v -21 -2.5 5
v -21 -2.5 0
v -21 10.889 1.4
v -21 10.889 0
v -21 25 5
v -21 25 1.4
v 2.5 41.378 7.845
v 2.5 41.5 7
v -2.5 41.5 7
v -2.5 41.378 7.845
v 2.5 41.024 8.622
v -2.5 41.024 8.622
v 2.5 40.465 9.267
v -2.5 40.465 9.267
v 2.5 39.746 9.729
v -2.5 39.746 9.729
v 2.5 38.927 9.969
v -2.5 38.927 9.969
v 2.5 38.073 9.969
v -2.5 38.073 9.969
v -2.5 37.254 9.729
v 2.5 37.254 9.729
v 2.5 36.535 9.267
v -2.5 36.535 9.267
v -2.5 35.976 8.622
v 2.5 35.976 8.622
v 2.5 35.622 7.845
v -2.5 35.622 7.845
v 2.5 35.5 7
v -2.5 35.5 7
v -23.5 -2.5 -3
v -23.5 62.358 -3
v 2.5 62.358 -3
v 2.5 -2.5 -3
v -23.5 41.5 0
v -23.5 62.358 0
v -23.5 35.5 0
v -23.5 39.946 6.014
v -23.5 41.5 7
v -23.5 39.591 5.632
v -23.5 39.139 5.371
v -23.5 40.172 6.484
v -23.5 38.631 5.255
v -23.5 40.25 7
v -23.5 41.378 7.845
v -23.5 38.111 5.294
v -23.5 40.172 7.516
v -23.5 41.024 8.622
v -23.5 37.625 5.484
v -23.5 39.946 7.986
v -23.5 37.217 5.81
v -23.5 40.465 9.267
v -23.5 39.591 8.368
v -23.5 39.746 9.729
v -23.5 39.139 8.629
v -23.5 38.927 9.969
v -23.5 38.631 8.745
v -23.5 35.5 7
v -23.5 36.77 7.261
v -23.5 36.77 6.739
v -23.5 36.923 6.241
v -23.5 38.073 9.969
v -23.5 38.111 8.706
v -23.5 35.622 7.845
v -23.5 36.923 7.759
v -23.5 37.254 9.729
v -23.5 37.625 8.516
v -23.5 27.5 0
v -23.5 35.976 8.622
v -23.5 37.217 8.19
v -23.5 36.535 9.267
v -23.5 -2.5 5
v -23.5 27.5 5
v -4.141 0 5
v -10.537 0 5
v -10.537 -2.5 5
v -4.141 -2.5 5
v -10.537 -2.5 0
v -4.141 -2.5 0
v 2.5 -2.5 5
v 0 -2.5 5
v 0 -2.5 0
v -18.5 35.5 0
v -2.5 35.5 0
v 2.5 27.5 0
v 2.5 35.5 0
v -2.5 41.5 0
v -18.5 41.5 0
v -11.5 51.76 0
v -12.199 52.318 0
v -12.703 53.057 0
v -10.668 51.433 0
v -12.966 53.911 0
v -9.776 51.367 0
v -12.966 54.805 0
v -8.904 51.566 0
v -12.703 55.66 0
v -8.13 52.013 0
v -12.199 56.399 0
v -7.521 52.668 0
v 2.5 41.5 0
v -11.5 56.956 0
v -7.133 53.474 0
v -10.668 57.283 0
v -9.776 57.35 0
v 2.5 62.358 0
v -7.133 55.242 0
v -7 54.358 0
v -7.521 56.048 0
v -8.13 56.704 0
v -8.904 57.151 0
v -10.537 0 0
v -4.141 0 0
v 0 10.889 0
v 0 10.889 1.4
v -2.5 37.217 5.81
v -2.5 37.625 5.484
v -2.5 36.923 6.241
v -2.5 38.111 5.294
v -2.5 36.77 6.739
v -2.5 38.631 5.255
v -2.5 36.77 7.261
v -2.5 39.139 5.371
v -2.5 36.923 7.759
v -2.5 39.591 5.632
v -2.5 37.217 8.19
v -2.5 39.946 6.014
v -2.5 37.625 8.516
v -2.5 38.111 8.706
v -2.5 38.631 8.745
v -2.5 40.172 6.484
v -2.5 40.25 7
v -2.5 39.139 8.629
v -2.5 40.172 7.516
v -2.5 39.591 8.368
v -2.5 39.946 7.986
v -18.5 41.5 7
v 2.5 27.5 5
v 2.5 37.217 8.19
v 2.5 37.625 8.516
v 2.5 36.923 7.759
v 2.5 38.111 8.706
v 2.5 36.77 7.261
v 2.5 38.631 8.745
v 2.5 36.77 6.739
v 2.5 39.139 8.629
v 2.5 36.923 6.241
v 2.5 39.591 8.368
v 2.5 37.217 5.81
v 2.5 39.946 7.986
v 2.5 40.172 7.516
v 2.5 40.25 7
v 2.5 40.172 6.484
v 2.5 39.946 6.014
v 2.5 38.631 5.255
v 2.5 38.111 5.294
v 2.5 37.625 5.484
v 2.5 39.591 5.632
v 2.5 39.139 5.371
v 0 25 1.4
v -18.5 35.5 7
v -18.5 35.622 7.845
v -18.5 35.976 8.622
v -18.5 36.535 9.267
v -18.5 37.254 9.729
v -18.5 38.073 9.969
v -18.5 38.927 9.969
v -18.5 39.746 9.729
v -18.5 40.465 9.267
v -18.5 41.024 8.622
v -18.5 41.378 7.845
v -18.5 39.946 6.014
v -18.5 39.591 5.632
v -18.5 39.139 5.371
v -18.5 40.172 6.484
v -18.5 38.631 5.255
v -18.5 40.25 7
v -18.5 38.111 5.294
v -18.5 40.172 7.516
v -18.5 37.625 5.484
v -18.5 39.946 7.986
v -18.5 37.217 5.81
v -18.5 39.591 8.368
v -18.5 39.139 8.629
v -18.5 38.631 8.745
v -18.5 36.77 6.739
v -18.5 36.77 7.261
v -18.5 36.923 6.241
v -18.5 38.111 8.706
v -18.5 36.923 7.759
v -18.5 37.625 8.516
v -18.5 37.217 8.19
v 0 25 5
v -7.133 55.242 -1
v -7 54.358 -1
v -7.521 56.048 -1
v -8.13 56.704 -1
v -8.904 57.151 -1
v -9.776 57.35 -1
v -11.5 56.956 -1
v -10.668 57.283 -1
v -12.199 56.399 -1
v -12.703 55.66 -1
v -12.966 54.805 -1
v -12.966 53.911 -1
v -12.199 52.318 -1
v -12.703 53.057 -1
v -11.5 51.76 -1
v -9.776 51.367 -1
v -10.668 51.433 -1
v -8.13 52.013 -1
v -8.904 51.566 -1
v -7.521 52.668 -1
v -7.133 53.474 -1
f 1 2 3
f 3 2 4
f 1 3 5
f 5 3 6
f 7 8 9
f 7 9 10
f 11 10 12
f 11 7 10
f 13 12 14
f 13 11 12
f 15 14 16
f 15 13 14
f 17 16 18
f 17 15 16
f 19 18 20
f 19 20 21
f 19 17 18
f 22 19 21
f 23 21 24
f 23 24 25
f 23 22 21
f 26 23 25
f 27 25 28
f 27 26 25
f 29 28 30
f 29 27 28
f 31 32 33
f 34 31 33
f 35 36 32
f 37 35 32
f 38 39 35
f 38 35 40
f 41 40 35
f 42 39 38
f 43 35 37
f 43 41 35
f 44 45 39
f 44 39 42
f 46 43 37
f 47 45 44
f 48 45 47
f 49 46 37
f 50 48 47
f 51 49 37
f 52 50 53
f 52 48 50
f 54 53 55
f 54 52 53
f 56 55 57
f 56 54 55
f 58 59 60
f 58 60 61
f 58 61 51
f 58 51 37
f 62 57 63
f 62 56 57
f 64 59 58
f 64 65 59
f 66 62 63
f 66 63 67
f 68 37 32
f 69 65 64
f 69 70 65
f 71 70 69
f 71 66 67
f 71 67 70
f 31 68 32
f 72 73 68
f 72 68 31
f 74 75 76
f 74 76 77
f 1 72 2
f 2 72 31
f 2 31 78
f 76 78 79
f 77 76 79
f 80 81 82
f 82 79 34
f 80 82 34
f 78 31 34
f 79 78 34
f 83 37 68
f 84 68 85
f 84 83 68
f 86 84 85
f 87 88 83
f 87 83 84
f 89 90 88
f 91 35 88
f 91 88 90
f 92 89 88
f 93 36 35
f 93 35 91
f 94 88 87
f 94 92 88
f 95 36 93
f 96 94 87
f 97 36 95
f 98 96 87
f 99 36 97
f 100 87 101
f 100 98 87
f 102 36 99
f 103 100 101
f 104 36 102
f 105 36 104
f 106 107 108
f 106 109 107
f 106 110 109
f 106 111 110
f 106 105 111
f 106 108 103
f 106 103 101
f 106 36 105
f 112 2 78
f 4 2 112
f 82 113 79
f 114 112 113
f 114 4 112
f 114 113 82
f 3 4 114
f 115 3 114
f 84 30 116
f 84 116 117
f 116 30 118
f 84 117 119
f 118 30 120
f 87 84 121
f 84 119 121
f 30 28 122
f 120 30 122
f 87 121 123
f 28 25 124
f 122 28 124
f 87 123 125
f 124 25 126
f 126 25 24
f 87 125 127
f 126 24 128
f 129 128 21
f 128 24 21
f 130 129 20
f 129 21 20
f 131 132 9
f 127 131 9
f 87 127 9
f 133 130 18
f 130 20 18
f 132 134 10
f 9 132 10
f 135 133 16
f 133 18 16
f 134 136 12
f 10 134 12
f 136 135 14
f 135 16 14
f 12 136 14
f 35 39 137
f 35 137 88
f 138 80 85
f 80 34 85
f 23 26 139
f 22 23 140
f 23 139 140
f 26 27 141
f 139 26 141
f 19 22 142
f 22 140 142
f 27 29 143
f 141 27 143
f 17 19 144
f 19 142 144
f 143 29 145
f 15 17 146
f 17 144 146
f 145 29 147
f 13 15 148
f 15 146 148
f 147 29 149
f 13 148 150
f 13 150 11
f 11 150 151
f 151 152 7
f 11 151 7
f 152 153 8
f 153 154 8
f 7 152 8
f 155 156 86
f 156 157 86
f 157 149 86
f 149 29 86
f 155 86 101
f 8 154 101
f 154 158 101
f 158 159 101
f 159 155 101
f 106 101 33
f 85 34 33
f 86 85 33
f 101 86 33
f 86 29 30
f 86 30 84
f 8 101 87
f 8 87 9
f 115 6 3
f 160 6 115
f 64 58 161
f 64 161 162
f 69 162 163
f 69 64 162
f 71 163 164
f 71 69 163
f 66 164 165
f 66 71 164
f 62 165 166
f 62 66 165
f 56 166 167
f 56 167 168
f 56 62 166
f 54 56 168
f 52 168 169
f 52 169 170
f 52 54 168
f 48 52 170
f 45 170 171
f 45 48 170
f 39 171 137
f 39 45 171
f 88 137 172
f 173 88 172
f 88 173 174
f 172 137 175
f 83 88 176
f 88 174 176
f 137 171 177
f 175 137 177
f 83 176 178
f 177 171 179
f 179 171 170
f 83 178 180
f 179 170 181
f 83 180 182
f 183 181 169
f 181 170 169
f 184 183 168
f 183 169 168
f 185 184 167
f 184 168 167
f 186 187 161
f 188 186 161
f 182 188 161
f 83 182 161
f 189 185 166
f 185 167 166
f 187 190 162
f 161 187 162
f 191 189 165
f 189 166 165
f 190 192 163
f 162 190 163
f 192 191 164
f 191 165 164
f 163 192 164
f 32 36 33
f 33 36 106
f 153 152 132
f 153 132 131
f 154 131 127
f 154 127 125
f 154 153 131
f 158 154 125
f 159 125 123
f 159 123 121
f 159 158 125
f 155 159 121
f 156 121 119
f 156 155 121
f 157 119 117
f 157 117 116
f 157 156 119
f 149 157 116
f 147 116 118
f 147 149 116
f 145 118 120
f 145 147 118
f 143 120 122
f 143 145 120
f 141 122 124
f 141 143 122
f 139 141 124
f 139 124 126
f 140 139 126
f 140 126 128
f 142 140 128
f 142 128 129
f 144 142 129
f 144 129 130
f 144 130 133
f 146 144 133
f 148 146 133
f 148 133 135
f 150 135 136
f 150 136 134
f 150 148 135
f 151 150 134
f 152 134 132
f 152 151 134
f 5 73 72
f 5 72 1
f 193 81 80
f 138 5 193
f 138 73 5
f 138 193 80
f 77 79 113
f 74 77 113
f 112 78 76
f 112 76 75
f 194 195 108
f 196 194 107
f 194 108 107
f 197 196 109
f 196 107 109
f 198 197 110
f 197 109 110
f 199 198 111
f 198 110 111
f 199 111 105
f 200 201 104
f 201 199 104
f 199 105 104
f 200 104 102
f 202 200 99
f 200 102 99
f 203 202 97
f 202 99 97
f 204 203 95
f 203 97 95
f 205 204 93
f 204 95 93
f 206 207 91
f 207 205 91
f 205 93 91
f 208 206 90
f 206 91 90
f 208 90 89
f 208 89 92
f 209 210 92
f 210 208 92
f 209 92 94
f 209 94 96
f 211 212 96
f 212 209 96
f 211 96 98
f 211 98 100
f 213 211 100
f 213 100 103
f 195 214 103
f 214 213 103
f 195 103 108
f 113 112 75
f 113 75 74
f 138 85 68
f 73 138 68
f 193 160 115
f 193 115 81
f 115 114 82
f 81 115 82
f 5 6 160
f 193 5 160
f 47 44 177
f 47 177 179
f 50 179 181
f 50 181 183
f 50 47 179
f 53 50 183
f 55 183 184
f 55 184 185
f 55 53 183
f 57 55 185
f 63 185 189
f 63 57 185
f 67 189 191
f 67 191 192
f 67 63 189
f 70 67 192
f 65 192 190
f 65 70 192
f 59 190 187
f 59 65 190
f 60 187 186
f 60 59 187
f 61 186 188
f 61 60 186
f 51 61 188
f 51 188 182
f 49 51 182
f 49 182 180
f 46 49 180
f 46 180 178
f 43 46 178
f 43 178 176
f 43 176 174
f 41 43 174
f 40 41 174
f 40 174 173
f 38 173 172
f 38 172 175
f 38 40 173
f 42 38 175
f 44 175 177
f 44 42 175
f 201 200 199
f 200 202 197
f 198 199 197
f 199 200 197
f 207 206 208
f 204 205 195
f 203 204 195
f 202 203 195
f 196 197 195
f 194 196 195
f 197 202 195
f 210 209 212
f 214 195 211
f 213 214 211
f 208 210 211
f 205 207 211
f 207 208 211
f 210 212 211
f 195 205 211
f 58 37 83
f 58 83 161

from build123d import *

# Parameters (mm, degrees)
F0_W     = 6.3956826925
F0_H     = 2.5
F0_W_2   = 4.1414871812
F0_W_3   = 5.4119601846
F0_W_4   = 5.0508699417
F0_W_5   = 26
F0_H_2   = 34.8582080007
F0_R     = 3
F0_W_6   = 21
F0_H_3   = 14.1105238348
F1_DEPTH = 3
F2_DEPTH = 5
F3_DEPTH = 1.4
F5_DEPTH = 5
F7_DEPTH = 5
F8_R     = 3
F9_DEPTH = 2


with BuildPart() as f1:
    # F0 (on Top) → F1 (new body)
    with BuildSketch(Plane.XY):
        with Locations((-7.3393285275, -1.25)):
            Rectangle(F0_W, F0_H)
        with Locations((-2.0707435906, -1.25)):
            Rectangle(F0_W_2, F0_H)
        with Locations((-13.243149966, -1.25)):
            Rectangle(F0_W_3, F0_H)
        Polygon((0, 10.8894761652), (0, 0), (0, -2.5), (2.5, -2.5), (2.5, 27.5), (-23.5, 27.5), (-23.5, -2.5), (-21, -2.5), (-21, 0), (-21, 10.8894761652), (-21, 25), (0, 25), align=None)
        with Locations((-18.4745650291, -1.25)):
            Rectangle(F0_W_4, F0_H)
        with Locations((-10.5, 44.9291040003)):
            Rectangle(F0_W_5, F0_H_2)
        with Locations((-10, 54.3582080007)):
            Circle(F0_R, mode=Mode.SUBTRACT)
        with Locations((-10.5, 17.9447380826)):
            Rectangle(F0_W_6, F0_H_3)
        Polygon((-4.1414871812, 0), (0, 0), (0, 10.8894761652), (-21, 10.8894761652), (-21, 0), (-15.9491300583, 0), (-10.5371698737, 0), align=None)
    extrude(amount=-F1_DEPTH)

    # F0 (on Top) → F2 (join)
    with BuildSketch(Plane.XY):
        Polygon((0, 10.8894761652), (0, 0), (0, -2.5), (2.5, -2.5), (2.5, 27.5), (-23.5, 27.5), (-23.5, -2.5), (-21, -2.5), (-21, 0), (-21, 10.8894761652), (-21, 25), (0, 25), align=None)
        with Locations((-7.3393285275, -1.25)):
            Rectangle(F0_W, F0_H)
    extrude(amount=F2_DEPTH)

    # F0 (on Top) → F3 (join)
    with BuildSketch(Plane.XY):
        with Locations((-10.5, 17.9447380826)):
            Rectangle(F0_W_6, F0_H_3)
    extrude(amount=F3_DEPTH)

    # F4 (on face) → F5 (join)
    with BuildSketch(Plane.YZ.offset(2.5)):
        with BuildLine():
            ThreePointArc((41.5, 7), (38.5, 10), (35.5, 7))
            Line((35.5, 7), (36.75, 7))
            ThreePointArc((36.75, 7), (38.5, 8.75), (40.25, 7))
            Line((40.25, 7), (41.5, 7))
        make_face()
        with BuildLine():
            Line((35.5, 7), (35.5, 0))
            Line((35.5, 0), (41.5, 0))
            Line((41.5, 0), (41.5, 7))
            Line((41.5, 7), (40.25, 7))
            ThreePointArc((40.25, 7), (38.5, 5.25), (36.75, 7))
            Line((36.75, 7), (35.5, 7))
        make_face()
    extrude(amount=-F5_DEPTH)

    # F6 (on face) → F7 (join)
    with BuildSketch(Plane(origin=(-23.5, 0, 0), x_dir=(0, -1, 0), z_dir=(-1, 0, 0))):
        with BuildLine():
            Line((-41.5, 7), (-41.5, 0))
            Line((-41.5, 0), (-35.5, 0))
            Line((-35.5, 0), (-35.5, 7))
            Line((-35.5, 7), (-36.75, 7))
            ThreePointArc((-36.75, 7), (-38.5, 5.25), (-40.25, 7))
            Line((-40.25, 7), (-41.5, 7))
        make_face()
        with BuildLine():
            ThreePointArc((-35.5, 7), (-38.5, 10), (-41.5, 7))
            Line((-41.5, 7), (-40.25, 7))
            ThreePointArc((-40.25, 7), (-38.5, 8.75), (-36.75, 7))
            Line((-36.75, 7), (-35.5, 7))
        make_face()
    extrude(amount=-F7_DEPTH)

    # F8 (on face) → F9 (join)
    with BuildSketch(Plane(origin=(0, 0, -3), x_dir=(1, 0, 0), z_dir=(0, 0, -1))):
        with Locations((-10, -54.3582080007)):
            Circle(F8_R)
    extrude(amount=-F9_DEPTH)


solid = f1.part
